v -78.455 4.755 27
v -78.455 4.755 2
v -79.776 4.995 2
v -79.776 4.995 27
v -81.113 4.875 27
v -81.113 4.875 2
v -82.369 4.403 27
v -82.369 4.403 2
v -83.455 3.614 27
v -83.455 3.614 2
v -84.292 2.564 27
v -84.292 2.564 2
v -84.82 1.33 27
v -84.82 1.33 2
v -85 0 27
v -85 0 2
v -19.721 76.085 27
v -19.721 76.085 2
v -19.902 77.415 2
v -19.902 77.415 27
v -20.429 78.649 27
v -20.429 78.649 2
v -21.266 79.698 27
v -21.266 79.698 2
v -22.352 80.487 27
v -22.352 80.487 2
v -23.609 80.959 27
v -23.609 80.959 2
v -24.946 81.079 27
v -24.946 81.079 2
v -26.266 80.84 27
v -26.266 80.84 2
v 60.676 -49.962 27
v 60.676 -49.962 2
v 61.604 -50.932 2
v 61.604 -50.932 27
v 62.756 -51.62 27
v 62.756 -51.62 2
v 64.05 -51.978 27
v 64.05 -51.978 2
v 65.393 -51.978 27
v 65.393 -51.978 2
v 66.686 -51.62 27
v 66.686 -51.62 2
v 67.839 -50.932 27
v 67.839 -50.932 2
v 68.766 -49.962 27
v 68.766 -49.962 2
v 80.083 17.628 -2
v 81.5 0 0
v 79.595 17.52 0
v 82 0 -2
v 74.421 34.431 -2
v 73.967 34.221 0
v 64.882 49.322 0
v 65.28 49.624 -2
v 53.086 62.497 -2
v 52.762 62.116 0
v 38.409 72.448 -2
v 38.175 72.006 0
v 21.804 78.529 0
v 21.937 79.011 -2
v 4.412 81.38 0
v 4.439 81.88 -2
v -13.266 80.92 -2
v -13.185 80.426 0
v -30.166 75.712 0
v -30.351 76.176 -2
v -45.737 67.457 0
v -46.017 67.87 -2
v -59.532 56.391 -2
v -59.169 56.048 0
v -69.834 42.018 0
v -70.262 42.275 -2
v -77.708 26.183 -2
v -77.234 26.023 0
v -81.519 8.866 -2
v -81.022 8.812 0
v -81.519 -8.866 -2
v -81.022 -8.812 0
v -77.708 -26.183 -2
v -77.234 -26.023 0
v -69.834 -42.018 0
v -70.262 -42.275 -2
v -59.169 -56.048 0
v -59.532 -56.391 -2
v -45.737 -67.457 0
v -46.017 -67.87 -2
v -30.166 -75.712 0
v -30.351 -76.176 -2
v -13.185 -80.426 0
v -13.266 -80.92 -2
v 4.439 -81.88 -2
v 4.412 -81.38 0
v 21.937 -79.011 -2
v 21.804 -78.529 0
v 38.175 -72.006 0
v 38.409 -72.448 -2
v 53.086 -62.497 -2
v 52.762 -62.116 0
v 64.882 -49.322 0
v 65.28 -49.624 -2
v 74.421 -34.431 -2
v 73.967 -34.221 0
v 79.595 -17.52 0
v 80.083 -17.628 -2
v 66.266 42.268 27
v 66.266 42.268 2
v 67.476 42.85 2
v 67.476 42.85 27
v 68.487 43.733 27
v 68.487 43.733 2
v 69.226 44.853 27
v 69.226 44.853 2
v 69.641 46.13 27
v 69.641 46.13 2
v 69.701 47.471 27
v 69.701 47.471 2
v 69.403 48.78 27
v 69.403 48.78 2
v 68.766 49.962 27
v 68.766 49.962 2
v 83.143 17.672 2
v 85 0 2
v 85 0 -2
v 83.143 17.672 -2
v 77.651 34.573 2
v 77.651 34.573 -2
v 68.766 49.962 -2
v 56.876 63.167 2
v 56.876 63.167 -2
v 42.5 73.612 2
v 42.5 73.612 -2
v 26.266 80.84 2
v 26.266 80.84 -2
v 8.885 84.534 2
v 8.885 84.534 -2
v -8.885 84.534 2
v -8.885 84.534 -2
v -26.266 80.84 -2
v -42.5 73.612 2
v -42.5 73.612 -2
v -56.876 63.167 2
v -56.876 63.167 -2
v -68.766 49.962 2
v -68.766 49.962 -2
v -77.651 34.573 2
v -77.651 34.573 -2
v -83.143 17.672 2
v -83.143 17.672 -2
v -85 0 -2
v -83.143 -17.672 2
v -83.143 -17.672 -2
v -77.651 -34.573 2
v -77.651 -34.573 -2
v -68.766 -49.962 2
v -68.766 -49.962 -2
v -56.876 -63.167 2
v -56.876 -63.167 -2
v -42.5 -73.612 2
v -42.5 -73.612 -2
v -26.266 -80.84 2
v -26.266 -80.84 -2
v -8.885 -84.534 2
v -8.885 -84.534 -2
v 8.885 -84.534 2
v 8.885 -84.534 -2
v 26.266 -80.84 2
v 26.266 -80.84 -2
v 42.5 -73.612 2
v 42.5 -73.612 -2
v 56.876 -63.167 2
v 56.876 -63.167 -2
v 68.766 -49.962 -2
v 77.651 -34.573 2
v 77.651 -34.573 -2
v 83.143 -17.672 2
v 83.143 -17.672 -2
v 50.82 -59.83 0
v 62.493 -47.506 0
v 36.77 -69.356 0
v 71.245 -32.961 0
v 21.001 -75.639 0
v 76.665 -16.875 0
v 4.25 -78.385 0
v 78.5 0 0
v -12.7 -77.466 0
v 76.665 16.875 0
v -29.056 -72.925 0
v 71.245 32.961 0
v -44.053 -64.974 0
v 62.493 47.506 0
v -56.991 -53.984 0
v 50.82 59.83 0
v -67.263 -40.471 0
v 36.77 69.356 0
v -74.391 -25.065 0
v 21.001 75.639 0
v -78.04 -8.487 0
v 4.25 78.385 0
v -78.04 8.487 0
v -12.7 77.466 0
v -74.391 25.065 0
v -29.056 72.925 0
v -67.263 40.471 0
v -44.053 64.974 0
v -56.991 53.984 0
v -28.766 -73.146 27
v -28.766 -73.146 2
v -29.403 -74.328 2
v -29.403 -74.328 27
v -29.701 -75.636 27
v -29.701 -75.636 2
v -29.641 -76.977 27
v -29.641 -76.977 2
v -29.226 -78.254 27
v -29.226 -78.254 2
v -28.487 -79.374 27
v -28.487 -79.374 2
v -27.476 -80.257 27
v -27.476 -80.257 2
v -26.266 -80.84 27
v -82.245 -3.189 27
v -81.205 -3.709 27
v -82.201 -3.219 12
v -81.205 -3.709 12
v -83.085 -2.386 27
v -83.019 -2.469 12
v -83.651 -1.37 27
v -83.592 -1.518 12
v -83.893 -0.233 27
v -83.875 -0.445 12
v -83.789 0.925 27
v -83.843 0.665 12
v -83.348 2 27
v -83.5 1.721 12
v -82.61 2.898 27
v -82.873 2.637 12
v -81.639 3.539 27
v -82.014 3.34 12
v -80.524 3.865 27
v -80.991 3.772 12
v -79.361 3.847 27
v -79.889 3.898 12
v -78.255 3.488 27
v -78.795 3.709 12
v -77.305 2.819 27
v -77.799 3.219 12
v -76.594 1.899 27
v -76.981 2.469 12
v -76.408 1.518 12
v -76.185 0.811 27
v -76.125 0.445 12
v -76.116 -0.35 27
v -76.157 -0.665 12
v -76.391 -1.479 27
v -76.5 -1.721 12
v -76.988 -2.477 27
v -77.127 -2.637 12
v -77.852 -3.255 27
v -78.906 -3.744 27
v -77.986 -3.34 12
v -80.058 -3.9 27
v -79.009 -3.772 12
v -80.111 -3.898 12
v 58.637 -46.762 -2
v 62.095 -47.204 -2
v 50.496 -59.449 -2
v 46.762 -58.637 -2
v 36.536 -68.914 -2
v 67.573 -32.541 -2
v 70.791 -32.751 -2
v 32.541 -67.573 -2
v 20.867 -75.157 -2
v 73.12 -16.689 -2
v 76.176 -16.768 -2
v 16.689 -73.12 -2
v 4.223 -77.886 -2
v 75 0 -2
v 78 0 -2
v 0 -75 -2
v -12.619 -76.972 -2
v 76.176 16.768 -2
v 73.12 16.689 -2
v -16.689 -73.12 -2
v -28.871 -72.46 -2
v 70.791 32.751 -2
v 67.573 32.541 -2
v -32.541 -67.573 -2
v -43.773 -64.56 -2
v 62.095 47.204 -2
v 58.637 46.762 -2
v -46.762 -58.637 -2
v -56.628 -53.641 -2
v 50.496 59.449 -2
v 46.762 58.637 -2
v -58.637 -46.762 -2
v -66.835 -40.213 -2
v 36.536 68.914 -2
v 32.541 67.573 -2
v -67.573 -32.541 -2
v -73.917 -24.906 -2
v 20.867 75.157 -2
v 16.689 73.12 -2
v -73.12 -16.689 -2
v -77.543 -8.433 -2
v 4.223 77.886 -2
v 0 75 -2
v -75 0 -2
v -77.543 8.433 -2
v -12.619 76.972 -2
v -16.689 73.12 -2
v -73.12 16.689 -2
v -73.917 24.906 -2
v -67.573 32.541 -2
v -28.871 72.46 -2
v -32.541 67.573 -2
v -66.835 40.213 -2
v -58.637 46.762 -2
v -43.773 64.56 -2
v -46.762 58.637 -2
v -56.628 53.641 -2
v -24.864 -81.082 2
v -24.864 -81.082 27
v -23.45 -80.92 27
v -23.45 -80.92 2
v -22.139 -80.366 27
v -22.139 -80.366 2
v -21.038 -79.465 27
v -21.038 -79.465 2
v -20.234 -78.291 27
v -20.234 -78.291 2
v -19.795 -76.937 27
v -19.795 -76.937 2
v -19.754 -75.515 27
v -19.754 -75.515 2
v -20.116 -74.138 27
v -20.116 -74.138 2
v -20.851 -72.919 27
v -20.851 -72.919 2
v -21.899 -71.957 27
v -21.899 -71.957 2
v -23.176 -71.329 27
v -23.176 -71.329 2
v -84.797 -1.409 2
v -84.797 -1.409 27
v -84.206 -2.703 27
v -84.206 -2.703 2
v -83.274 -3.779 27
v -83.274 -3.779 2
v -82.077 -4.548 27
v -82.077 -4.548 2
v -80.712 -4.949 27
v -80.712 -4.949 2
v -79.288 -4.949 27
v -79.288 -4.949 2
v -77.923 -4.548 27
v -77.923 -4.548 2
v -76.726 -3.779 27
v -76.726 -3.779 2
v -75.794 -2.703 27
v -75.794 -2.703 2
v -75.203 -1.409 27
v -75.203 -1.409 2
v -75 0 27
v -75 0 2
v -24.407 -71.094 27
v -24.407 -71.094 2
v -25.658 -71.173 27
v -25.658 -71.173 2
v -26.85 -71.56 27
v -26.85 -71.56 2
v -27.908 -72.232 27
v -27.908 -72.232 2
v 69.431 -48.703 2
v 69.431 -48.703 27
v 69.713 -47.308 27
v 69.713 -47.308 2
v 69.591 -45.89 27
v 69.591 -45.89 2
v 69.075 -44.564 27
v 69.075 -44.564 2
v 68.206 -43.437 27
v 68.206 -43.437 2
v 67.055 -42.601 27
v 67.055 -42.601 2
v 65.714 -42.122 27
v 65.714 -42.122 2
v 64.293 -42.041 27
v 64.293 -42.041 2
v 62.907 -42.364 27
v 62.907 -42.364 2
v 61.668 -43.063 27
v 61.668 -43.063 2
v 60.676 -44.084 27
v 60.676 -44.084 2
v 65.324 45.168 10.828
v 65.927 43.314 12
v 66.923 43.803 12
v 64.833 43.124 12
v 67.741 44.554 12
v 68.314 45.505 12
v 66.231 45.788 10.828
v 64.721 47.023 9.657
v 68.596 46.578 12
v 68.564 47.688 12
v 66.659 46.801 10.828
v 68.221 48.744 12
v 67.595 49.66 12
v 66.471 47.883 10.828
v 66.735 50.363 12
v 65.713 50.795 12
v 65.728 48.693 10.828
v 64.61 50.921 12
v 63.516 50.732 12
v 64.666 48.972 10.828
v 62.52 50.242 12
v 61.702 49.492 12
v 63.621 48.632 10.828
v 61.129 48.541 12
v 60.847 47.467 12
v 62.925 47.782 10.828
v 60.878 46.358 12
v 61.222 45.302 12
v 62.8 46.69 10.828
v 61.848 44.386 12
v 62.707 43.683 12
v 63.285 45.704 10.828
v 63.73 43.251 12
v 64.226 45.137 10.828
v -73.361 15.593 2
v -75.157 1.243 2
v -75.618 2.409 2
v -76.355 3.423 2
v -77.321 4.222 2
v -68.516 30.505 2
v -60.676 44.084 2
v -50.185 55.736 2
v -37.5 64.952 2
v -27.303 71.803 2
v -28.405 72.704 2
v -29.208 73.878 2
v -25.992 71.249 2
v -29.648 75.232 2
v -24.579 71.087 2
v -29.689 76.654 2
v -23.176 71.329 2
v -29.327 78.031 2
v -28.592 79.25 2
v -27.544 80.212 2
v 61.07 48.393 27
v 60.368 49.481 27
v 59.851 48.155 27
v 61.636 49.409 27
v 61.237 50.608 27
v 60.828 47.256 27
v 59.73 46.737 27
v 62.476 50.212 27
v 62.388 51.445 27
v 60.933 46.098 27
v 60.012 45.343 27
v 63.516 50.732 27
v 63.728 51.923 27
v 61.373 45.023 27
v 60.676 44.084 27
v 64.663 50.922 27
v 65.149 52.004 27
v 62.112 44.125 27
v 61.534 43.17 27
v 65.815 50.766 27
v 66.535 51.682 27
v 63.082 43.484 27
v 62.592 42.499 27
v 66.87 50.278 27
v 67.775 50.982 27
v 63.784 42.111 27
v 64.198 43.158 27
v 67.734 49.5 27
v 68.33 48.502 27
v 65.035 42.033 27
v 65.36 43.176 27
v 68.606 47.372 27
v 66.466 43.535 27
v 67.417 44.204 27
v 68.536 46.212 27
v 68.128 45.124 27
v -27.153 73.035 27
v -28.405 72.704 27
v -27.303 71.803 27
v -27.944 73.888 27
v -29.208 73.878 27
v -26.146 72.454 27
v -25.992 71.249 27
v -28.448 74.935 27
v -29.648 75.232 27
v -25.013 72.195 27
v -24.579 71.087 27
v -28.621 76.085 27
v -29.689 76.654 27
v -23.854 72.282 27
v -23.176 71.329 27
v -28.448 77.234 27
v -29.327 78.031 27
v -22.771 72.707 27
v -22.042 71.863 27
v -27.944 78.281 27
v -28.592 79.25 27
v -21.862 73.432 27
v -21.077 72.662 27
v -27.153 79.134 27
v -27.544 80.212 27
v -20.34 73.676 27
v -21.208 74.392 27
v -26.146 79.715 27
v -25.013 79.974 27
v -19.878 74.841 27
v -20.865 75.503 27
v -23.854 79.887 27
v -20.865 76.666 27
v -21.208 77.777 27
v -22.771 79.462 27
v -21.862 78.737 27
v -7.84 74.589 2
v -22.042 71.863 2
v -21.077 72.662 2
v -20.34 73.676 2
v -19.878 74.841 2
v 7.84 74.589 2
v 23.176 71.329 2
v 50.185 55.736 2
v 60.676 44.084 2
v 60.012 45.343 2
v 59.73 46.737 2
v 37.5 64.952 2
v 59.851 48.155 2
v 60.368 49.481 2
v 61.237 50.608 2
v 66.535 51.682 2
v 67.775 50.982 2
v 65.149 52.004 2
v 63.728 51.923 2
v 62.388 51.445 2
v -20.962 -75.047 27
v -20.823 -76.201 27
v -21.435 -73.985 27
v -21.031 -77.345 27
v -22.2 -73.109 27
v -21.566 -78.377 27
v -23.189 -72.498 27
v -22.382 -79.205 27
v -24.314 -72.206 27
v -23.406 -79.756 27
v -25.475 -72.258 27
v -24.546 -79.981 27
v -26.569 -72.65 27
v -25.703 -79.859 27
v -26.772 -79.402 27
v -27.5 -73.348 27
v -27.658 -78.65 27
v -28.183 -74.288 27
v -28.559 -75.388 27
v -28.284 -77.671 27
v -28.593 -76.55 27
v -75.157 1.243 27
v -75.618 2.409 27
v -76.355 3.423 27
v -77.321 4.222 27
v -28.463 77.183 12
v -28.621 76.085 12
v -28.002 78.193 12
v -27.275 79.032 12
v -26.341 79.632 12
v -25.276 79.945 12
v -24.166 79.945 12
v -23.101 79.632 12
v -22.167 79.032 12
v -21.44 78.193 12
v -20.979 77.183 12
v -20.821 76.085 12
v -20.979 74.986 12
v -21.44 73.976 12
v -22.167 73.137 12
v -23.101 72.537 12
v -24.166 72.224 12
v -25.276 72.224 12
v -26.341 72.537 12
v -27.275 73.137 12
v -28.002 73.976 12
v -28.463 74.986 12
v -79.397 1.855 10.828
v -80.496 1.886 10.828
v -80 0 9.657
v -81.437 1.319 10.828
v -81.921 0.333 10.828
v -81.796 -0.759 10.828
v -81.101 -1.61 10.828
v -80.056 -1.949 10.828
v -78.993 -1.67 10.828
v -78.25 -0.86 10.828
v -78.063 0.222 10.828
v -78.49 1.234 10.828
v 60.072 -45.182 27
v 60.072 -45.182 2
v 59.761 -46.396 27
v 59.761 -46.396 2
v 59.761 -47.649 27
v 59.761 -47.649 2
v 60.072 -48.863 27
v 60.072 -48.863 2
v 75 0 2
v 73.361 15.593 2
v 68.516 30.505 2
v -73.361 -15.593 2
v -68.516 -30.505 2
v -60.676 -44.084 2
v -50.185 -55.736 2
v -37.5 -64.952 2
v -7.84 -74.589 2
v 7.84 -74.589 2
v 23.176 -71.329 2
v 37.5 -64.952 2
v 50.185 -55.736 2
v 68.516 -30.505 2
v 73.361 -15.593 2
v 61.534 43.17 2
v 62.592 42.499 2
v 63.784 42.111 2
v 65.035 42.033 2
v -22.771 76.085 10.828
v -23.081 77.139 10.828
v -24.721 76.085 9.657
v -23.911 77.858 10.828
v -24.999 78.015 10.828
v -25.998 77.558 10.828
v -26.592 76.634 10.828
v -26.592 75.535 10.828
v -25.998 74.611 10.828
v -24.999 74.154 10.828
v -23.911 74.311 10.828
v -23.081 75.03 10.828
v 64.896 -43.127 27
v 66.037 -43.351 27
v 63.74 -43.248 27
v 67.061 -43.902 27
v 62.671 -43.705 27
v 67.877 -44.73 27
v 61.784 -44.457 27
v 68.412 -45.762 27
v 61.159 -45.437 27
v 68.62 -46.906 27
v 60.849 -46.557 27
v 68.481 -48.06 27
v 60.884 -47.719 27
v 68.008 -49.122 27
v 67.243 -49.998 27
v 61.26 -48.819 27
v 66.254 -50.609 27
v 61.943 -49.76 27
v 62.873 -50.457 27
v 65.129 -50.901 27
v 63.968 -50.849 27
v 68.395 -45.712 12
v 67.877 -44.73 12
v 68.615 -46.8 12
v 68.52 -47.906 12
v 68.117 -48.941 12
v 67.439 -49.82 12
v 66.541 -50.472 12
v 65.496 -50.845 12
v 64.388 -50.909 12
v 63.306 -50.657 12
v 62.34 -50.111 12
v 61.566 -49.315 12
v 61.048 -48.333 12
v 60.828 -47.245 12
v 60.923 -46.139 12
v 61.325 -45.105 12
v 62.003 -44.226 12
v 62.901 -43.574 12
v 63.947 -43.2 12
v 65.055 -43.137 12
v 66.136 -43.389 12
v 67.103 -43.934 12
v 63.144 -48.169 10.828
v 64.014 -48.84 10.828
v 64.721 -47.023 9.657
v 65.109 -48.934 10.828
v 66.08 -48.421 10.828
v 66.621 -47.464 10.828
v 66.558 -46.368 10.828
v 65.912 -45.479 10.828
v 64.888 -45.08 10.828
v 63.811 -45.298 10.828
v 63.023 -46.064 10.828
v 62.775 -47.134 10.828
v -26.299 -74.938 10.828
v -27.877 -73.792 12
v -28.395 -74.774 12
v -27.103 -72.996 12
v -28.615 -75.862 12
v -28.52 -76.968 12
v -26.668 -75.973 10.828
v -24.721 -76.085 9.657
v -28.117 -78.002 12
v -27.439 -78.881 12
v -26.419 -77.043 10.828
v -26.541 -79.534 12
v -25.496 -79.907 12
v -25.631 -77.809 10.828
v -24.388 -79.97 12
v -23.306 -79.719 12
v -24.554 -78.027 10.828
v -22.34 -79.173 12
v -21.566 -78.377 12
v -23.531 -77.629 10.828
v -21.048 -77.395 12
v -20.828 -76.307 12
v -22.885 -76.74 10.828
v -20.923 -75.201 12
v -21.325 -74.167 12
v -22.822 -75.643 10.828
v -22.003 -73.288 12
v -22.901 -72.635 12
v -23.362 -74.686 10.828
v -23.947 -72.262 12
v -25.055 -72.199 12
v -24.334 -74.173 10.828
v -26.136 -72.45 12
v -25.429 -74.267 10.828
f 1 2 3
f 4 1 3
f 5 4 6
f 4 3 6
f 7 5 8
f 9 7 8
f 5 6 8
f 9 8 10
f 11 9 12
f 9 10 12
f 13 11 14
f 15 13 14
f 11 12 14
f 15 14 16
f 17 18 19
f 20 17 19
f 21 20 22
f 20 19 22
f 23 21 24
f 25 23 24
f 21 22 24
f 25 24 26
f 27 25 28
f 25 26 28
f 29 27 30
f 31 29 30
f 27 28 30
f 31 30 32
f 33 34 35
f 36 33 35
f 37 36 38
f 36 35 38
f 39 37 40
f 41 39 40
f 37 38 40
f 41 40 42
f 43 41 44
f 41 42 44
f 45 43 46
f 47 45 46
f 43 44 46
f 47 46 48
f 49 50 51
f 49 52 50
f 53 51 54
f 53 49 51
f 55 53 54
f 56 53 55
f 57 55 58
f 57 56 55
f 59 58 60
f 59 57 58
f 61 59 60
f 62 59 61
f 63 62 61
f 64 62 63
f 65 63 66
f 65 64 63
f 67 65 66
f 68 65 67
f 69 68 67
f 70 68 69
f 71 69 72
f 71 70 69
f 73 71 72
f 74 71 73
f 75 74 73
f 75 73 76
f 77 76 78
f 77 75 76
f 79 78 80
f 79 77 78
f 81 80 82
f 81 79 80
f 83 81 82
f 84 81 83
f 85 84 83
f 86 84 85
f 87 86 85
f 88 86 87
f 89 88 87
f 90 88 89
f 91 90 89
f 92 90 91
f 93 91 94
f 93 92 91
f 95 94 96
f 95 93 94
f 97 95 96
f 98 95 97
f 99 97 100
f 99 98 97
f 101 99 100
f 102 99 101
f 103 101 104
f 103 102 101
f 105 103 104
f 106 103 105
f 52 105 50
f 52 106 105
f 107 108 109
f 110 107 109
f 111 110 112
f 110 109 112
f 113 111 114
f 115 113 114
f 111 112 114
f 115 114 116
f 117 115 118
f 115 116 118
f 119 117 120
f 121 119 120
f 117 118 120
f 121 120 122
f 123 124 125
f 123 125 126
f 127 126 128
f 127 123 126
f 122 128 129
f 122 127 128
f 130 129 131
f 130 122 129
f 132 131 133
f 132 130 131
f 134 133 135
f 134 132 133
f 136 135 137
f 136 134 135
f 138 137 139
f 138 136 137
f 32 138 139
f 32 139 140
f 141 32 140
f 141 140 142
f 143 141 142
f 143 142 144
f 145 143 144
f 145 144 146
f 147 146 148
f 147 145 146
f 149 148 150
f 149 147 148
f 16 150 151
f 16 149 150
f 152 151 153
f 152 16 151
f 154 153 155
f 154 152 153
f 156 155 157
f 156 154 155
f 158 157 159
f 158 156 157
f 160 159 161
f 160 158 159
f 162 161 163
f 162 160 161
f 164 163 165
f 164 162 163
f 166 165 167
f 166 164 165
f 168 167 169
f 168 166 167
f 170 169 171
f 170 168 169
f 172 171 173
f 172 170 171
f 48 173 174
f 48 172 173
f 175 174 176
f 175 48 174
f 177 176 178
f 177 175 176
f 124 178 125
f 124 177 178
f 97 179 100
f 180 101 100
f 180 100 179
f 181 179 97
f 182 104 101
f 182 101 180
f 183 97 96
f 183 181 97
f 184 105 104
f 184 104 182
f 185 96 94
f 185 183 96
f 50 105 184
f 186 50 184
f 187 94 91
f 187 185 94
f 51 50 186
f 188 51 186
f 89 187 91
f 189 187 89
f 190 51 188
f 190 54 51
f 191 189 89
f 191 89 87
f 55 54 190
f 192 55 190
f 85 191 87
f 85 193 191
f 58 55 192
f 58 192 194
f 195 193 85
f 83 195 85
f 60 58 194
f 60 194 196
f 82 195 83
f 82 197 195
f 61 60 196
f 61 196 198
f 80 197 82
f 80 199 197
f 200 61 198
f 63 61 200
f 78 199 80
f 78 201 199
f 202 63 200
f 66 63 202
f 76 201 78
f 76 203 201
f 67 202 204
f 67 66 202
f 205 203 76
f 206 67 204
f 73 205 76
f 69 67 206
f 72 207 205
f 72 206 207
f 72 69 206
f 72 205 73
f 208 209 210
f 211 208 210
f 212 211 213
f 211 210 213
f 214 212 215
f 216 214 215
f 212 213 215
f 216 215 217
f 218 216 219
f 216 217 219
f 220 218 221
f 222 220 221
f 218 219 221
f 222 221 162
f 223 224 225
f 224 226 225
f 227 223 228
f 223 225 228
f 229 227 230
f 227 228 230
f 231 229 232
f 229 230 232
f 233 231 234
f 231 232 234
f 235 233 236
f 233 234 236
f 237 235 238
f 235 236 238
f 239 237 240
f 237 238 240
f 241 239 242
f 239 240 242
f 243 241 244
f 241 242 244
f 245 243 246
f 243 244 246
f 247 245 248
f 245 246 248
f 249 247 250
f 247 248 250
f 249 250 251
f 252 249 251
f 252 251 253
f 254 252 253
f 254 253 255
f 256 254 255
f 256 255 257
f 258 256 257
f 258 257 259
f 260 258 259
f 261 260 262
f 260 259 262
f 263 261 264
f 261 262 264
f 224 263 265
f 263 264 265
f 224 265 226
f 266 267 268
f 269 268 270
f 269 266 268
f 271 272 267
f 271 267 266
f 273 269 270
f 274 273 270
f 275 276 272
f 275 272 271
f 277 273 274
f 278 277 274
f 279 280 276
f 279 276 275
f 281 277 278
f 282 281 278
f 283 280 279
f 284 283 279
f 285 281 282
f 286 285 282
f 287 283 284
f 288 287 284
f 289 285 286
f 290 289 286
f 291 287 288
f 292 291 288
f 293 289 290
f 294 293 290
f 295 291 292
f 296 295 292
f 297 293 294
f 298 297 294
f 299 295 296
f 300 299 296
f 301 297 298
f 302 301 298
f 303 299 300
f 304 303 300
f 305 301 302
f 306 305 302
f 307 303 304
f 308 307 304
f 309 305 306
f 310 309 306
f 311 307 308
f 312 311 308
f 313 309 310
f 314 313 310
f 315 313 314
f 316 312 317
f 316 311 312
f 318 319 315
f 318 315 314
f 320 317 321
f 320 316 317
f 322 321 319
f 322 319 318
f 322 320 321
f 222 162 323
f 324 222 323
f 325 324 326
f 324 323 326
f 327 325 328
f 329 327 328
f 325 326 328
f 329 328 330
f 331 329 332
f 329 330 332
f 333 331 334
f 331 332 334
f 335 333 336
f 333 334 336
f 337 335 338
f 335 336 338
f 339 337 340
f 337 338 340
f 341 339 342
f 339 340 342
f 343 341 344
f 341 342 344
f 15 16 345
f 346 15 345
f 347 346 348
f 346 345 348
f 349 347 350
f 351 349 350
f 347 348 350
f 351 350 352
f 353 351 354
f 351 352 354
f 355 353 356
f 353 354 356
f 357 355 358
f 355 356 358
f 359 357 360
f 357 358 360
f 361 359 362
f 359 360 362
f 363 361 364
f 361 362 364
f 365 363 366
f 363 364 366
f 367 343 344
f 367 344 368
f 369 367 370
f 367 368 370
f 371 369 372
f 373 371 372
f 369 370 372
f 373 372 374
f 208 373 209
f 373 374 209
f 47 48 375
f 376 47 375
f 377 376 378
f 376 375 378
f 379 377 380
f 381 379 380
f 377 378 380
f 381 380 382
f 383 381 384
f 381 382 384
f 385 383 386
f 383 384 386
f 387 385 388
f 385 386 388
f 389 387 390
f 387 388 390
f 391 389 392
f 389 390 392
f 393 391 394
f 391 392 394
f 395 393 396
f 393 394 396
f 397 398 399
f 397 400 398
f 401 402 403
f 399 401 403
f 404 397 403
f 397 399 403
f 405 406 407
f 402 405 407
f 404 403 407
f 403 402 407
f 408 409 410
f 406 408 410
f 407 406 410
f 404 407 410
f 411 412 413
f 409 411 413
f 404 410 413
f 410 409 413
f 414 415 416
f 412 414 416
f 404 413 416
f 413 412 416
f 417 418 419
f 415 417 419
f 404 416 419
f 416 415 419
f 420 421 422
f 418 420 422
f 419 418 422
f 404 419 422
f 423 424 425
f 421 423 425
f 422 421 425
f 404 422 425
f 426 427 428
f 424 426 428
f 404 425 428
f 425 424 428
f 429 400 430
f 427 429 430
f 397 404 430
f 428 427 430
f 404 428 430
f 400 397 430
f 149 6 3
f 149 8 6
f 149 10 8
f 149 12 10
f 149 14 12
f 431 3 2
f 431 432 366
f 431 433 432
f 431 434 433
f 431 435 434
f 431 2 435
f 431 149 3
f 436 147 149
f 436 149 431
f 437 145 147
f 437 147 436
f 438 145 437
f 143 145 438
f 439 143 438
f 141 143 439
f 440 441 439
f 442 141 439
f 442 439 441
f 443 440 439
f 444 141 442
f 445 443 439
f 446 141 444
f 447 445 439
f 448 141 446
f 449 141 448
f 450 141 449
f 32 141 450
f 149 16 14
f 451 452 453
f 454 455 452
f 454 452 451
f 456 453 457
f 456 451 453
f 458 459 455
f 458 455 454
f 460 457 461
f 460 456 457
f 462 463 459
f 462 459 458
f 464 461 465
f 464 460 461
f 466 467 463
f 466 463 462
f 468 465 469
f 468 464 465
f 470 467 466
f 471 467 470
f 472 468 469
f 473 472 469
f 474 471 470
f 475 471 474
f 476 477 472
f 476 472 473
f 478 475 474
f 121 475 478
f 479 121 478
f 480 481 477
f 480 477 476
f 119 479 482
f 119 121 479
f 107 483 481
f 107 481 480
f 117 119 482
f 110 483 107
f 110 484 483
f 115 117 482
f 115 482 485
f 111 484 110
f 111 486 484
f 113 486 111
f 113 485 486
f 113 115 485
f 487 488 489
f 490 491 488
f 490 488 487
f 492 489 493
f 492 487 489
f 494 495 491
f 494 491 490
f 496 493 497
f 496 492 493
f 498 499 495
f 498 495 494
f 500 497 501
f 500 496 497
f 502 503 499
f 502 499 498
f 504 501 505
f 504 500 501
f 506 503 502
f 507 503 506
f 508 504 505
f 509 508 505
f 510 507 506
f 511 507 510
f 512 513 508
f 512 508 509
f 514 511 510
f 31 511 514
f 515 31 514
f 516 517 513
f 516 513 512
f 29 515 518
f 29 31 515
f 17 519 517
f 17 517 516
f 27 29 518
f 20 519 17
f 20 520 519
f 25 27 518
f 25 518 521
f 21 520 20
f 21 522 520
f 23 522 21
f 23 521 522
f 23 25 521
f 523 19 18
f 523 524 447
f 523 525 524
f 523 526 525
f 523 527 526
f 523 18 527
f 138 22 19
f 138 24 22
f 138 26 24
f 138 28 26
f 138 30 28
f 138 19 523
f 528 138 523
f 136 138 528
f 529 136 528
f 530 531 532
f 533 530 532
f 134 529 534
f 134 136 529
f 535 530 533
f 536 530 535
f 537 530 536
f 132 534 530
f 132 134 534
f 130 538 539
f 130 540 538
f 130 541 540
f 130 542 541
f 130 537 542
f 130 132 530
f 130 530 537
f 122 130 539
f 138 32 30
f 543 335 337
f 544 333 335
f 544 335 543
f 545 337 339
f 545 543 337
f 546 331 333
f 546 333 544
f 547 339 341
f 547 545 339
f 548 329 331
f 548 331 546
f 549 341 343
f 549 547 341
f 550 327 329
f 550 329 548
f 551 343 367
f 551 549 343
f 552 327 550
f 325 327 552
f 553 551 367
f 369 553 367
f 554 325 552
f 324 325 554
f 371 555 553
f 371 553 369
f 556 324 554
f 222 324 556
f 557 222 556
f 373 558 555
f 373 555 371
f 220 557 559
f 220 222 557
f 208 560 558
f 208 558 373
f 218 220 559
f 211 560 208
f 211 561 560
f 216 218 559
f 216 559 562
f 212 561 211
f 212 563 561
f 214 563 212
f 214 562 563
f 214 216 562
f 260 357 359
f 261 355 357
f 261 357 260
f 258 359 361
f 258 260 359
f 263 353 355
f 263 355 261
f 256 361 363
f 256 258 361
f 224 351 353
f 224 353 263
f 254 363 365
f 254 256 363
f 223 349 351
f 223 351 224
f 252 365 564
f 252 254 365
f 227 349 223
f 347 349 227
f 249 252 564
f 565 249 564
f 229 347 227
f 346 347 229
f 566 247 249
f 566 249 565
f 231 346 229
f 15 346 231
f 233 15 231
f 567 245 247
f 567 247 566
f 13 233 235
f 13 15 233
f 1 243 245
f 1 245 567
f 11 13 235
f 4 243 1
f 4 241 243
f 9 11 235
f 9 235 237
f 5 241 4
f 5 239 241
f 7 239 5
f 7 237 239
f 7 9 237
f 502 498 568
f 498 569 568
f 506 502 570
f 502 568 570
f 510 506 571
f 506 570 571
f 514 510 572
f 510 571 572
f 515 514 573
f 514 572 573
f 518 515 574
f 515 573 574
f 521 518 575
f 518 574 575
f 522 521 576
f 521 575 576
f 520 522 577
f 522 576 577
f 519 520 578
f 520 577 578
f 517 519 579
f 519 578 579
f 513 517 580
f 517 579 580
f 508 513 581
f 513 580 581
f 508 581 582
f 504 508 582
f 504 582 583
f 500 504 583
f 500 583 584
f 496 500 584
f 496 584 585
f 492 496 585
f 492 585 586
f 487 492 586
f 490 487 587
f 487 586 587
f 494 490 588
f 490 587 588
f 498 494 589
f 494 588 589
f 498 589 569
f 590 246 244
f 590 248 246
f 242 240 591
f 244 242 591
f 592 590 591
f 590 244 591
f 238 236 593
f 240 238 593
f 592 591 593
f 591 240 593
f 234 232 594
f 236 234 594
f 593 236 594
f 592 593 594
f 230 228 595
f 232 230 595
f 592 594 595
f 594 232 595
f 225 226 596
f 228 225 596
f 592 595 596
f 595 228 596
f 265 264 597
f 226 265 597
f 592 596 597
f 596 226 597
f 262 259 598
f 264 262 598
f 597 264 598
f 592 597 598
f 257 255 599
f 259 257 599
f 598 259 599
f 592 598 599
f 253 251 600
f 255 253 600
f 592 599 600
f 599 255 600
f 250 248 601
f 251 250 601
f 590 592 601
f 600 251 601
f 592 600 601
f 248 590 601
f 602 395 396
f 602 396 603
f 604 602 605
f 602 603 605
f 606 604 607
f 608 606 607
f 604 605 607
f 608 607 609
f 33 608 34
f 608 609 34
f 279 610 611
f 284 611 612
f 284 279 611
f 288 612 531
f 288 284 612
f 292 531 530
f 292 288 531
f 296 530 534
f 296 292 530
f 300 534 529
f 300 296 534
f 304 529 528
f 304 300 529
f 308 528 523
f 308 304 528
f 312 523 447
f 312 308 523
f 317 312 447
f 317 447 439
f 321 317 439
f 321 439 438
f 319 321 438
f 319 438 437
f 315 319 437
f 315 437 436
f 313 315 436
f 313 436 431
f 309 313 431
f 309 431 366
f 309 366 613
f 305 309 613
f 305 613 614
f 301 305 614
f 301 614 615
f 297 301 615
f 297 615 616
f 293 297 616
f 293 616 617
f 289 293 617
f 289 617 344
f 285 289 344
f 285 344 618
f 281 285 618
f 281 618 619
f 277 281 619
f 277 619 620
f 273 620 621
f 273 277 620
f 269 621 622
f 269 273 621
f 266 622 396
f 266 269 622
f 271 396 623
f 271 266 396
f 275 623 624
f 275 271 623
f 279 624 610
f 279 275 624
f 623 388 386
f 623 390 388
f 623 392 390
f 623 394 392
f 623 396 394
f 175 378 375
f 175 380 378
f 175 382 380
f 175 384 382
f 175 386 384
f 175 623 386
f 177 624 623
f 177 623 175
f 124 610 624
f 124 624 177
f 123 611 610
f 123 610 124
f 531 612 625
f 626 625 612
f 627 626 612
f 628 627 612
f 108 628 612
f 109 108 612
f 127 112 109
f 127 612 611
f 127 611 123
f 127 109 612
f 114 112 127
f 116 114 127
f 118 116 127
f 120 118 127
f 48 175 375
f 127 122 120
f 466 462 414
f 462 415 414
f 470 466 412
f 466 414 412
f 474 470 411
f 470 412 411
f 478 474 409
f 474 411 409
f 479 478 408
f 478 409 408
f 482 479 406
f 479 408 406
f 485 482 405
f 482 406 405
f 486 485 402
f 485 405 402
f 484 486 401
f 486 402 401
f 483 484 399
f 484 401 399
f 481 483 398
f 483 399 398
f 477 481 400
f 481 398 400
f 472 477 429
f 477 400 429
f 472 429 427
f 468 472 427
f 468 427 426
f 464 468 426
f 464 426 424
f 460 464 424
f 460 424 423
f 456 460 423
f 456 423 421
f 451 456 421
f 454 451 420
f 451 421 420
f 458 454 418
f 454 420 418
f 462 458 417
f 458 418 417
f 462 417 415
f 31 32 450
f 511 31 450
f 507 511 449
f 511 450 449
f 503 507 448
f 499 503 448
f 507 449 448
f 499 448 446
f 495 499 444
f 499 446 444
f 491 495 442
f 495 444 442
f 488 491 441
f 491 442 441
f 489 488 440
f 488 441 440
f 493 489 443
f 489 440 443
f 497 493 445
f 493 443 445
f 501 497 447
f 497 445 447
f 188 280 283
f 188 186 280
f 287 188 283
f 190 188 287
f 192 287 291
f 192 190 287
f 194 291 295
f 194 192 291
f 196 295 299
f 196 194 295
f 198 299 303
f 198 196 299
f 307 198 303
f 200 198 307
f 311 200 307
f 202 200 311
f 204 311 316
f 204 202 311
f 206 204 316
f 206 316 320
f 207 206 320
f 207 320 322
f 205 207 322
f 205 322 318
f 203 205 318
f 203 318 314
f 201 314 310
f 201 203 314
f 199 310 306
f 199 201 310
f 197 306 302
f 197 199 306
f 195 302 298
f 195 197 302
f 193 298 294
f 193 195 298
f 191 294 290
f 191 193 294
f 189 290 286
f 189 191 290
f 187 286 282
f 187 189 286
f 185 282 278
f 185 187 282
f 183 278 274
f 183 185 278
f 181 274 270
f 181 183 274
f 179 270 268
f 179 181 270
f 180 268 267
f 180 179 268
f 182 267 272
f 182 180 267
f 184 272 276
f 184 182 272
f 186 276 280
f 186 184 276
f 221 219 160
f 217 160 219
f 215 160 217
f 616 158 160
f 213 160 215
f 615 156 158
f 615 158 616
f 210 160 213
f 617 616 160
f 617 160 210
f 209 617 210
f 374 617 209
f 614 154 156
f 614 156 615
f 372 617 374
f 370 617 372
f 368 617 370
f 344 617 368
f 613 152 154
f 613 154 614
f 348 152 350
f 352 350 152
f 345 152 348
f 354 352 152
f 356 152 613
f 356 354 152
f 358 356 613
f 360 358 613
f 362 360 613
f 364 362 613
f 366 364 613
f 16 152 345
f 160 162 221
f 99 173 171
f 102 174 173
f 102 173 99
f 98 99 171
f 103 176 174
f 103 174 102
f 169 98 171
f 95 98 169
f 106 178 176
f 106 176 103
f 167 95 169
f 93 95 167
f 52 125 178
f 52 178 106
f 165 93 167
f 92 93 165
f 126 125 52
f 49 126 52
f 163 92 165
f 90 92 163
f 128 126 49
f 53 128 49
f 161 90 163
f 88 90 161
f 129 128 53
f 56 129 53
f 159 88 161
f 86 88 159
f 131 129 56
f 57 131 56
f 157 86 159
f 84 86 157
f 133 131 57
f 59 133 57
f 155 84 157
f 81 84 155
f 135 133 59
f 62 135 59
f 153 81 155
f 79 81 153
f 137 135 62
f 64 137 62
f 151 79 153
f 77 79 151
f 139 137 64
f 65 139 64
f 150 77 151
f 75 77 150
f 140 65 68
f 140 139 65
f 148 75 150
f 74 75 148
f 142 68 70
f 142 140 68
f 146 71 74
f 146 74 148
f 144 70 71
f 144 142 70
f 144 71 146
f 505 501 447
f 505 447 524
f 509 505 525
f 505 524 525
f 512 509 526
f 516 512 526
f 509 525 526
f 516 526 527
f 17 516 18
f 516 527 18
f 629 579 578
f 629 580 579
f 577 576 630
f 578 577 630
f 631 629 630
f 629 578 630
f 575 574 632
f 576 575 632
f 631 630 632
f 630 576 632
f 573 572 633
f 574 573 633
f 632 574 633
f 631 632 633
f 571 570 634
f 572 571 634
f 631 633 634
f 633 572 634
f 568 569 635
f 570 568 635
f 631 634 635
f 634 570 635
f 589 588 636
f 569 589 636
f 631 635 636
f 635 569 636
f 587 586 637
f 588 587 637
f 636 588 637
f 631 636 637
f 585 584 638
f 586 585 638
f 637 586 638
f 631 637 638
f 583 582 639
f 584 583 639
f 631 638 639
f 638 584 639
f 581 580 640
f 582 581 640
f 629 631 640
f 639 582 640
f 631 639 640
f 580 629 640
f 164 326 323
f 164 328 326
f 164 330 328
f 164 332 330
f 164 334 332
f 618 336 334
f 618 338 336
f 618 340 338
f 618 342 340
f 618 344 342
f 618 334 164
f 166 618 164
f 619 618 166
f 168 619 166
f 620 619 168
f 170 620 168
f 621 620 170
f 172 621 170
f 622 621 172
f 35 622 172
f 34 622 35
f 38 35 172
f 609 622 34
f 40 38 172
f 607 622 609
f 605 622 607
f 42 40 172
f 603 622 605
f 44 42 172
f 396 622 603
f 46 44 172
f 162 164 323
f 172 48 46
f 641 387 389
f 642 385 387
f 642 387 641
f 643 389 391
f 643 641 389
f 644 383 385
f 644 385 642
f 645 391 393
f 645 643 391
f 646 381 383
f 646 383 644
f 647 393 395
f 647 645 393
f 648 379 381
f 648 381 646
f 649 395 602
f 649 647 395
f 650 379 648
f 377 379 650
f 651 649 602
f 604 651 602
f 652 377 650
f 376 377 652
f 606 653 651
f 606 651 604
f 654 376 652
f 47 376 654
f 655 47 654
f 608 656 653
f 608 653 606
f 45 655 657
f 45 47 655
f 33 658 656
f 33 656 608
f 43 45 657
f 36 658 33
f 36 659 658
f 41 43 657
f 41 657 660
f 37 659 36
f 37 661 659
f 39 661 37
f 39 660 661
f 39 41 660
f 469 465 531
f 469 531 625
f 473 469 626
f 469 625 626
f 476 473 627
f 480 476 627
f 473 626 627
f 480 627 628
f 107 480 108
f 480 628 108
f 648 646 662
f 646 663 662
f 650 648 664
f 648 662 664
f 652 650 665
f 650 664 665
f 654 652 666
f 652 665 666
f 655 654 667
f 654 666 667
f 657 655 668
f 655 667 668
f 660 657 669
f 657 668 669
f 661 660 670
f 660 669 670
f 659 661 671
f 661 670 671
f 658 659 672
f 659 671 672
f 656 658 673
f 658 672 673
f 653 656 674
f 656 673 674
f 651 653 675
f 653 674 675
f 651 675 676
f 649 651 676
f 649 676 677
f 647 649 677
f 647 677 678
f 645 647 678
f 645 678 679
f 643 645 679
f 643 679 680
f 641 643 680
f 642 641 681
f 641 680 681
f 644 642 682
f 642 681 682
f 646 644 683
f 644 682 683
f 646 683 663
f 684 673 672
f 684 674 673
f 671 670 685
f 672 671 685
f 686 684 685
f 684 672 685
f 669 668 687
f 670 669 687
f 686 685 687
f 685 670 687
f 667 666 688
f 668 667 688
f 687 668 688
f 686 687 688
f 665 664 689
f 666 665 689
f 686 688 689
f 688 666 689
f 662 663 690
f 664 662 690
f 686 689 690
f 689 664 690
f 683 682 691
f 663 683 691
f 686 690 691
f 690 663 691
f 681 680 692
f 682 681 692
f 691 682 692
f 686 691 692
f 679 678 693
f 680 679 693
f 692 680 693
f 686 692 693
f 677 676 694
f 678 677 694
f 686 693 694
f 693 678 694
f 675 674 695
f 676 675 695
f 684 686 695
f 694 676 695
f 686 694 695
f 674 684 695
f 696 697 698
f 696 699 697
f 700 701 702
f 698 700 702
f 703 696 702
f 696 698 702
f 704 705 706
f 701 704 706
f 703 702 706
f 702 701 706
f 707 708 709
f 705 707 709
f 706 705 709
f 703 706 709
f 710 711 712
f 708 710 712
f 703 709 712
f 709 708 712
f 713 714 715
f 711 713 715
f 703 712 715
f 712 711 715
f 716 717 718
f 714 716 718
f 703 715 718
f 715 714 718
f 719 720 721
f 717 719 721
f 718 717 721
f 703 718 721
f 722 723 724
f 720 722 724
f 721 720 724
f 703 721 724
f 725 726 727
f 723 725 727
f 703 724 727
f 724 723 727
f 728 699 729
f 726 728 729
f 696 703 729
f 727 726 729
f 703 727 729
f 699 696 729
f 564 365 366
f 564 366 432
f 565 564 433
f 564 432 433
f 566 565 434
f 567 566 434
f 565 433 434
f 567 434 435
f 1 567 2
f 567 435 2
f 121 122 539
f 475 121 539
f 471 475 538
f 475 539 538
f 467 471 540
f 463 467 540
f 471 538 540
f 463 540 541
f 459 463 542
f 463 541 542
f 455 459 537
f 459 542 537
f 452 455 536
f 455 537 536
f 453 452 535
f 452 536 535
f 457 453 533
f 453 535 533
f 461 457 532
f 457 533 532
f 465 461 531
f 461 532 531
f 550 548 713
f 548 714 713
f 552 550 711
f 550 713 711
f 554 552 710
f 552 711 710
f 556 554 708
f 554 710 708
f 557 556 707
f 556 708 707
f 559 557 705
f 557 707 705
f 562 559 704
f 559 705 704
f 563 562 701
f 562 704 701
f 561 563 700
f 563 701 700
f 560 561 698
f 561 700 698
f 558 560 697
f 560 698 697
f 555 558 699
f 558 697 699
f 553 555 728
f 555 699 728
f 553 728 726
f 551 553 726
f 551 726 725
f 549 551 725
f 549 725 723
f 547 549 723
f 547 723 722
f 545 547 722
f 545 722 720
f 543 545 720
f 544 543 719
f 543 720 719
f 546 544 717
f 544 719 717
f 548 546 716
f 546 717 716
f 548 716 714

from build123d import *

# Parameters (mm, degrees)
F9_DEPTH  = 25
F11_D     = 7.8
F11_DEPTH = 15
F11_TIP   = 2.3433564142
F12_COUNT = 5


with BuildPart() as f5:
    # F4 (on Front) → F5 (revolve)
    with BuildSketch(Plane.XZ):
        Polygon((75, -2), (78, -2), (78.5, 0), (80, 0), (81.5, 0), (82, -2), (85, -2), (85, 2), (80, 2), (75, 2), align=None)
    revolve(axis=Axis((0, 0, 0), (0, 0, 1)))

    # F8 (on face) → F9 (join)
    with BuildSketch(Plane.XY.offset(2)):
        with BuildLine():
            ThreePointArc((-26.2664438955, 80.8398040886), (-29.4766422296, 74.5394366339), (-23.176274556, 71.3292387293))
            ThreePointArc((-23.176274556, 71.3292387293), (-20.6762745713, 73.1455950516), (-19.72135955, 76.0845213036))
            ThreePointArc((-19.72135955, 76.0845213036), (-21.7824330221, 80.1296060819), (-26.2664438955, 80.8398040886))
        make_face()
    extrude(amount=F9_DEPTH)

    # F11
    with Locations(Plane.XY.offset(27)):
        with Locations((-24.72135955, 76.0845213036)):
            Hole(F11_D / 2, depth=F11_DEPTH)
            with Locations((0, 0, -(F11_DEPTH + F11_TIP / 2))):  # 118° drill point
                Cone(0, F11_D / 2, F11_TIP, mode=Mode.SUBTRACT)

    # F12: F5 ×5 about axis
    f12_axis = Axis((0, 0, 32.8164733946), (0, 0, 1))


with BuildPart() as f5_1:
    add(f5.part)
    for i in range(1, F12_COUNT):
        add(f5.part.rotate(f12_axis, i * 360 / F12_COUNT))


solid = f5_1.part
